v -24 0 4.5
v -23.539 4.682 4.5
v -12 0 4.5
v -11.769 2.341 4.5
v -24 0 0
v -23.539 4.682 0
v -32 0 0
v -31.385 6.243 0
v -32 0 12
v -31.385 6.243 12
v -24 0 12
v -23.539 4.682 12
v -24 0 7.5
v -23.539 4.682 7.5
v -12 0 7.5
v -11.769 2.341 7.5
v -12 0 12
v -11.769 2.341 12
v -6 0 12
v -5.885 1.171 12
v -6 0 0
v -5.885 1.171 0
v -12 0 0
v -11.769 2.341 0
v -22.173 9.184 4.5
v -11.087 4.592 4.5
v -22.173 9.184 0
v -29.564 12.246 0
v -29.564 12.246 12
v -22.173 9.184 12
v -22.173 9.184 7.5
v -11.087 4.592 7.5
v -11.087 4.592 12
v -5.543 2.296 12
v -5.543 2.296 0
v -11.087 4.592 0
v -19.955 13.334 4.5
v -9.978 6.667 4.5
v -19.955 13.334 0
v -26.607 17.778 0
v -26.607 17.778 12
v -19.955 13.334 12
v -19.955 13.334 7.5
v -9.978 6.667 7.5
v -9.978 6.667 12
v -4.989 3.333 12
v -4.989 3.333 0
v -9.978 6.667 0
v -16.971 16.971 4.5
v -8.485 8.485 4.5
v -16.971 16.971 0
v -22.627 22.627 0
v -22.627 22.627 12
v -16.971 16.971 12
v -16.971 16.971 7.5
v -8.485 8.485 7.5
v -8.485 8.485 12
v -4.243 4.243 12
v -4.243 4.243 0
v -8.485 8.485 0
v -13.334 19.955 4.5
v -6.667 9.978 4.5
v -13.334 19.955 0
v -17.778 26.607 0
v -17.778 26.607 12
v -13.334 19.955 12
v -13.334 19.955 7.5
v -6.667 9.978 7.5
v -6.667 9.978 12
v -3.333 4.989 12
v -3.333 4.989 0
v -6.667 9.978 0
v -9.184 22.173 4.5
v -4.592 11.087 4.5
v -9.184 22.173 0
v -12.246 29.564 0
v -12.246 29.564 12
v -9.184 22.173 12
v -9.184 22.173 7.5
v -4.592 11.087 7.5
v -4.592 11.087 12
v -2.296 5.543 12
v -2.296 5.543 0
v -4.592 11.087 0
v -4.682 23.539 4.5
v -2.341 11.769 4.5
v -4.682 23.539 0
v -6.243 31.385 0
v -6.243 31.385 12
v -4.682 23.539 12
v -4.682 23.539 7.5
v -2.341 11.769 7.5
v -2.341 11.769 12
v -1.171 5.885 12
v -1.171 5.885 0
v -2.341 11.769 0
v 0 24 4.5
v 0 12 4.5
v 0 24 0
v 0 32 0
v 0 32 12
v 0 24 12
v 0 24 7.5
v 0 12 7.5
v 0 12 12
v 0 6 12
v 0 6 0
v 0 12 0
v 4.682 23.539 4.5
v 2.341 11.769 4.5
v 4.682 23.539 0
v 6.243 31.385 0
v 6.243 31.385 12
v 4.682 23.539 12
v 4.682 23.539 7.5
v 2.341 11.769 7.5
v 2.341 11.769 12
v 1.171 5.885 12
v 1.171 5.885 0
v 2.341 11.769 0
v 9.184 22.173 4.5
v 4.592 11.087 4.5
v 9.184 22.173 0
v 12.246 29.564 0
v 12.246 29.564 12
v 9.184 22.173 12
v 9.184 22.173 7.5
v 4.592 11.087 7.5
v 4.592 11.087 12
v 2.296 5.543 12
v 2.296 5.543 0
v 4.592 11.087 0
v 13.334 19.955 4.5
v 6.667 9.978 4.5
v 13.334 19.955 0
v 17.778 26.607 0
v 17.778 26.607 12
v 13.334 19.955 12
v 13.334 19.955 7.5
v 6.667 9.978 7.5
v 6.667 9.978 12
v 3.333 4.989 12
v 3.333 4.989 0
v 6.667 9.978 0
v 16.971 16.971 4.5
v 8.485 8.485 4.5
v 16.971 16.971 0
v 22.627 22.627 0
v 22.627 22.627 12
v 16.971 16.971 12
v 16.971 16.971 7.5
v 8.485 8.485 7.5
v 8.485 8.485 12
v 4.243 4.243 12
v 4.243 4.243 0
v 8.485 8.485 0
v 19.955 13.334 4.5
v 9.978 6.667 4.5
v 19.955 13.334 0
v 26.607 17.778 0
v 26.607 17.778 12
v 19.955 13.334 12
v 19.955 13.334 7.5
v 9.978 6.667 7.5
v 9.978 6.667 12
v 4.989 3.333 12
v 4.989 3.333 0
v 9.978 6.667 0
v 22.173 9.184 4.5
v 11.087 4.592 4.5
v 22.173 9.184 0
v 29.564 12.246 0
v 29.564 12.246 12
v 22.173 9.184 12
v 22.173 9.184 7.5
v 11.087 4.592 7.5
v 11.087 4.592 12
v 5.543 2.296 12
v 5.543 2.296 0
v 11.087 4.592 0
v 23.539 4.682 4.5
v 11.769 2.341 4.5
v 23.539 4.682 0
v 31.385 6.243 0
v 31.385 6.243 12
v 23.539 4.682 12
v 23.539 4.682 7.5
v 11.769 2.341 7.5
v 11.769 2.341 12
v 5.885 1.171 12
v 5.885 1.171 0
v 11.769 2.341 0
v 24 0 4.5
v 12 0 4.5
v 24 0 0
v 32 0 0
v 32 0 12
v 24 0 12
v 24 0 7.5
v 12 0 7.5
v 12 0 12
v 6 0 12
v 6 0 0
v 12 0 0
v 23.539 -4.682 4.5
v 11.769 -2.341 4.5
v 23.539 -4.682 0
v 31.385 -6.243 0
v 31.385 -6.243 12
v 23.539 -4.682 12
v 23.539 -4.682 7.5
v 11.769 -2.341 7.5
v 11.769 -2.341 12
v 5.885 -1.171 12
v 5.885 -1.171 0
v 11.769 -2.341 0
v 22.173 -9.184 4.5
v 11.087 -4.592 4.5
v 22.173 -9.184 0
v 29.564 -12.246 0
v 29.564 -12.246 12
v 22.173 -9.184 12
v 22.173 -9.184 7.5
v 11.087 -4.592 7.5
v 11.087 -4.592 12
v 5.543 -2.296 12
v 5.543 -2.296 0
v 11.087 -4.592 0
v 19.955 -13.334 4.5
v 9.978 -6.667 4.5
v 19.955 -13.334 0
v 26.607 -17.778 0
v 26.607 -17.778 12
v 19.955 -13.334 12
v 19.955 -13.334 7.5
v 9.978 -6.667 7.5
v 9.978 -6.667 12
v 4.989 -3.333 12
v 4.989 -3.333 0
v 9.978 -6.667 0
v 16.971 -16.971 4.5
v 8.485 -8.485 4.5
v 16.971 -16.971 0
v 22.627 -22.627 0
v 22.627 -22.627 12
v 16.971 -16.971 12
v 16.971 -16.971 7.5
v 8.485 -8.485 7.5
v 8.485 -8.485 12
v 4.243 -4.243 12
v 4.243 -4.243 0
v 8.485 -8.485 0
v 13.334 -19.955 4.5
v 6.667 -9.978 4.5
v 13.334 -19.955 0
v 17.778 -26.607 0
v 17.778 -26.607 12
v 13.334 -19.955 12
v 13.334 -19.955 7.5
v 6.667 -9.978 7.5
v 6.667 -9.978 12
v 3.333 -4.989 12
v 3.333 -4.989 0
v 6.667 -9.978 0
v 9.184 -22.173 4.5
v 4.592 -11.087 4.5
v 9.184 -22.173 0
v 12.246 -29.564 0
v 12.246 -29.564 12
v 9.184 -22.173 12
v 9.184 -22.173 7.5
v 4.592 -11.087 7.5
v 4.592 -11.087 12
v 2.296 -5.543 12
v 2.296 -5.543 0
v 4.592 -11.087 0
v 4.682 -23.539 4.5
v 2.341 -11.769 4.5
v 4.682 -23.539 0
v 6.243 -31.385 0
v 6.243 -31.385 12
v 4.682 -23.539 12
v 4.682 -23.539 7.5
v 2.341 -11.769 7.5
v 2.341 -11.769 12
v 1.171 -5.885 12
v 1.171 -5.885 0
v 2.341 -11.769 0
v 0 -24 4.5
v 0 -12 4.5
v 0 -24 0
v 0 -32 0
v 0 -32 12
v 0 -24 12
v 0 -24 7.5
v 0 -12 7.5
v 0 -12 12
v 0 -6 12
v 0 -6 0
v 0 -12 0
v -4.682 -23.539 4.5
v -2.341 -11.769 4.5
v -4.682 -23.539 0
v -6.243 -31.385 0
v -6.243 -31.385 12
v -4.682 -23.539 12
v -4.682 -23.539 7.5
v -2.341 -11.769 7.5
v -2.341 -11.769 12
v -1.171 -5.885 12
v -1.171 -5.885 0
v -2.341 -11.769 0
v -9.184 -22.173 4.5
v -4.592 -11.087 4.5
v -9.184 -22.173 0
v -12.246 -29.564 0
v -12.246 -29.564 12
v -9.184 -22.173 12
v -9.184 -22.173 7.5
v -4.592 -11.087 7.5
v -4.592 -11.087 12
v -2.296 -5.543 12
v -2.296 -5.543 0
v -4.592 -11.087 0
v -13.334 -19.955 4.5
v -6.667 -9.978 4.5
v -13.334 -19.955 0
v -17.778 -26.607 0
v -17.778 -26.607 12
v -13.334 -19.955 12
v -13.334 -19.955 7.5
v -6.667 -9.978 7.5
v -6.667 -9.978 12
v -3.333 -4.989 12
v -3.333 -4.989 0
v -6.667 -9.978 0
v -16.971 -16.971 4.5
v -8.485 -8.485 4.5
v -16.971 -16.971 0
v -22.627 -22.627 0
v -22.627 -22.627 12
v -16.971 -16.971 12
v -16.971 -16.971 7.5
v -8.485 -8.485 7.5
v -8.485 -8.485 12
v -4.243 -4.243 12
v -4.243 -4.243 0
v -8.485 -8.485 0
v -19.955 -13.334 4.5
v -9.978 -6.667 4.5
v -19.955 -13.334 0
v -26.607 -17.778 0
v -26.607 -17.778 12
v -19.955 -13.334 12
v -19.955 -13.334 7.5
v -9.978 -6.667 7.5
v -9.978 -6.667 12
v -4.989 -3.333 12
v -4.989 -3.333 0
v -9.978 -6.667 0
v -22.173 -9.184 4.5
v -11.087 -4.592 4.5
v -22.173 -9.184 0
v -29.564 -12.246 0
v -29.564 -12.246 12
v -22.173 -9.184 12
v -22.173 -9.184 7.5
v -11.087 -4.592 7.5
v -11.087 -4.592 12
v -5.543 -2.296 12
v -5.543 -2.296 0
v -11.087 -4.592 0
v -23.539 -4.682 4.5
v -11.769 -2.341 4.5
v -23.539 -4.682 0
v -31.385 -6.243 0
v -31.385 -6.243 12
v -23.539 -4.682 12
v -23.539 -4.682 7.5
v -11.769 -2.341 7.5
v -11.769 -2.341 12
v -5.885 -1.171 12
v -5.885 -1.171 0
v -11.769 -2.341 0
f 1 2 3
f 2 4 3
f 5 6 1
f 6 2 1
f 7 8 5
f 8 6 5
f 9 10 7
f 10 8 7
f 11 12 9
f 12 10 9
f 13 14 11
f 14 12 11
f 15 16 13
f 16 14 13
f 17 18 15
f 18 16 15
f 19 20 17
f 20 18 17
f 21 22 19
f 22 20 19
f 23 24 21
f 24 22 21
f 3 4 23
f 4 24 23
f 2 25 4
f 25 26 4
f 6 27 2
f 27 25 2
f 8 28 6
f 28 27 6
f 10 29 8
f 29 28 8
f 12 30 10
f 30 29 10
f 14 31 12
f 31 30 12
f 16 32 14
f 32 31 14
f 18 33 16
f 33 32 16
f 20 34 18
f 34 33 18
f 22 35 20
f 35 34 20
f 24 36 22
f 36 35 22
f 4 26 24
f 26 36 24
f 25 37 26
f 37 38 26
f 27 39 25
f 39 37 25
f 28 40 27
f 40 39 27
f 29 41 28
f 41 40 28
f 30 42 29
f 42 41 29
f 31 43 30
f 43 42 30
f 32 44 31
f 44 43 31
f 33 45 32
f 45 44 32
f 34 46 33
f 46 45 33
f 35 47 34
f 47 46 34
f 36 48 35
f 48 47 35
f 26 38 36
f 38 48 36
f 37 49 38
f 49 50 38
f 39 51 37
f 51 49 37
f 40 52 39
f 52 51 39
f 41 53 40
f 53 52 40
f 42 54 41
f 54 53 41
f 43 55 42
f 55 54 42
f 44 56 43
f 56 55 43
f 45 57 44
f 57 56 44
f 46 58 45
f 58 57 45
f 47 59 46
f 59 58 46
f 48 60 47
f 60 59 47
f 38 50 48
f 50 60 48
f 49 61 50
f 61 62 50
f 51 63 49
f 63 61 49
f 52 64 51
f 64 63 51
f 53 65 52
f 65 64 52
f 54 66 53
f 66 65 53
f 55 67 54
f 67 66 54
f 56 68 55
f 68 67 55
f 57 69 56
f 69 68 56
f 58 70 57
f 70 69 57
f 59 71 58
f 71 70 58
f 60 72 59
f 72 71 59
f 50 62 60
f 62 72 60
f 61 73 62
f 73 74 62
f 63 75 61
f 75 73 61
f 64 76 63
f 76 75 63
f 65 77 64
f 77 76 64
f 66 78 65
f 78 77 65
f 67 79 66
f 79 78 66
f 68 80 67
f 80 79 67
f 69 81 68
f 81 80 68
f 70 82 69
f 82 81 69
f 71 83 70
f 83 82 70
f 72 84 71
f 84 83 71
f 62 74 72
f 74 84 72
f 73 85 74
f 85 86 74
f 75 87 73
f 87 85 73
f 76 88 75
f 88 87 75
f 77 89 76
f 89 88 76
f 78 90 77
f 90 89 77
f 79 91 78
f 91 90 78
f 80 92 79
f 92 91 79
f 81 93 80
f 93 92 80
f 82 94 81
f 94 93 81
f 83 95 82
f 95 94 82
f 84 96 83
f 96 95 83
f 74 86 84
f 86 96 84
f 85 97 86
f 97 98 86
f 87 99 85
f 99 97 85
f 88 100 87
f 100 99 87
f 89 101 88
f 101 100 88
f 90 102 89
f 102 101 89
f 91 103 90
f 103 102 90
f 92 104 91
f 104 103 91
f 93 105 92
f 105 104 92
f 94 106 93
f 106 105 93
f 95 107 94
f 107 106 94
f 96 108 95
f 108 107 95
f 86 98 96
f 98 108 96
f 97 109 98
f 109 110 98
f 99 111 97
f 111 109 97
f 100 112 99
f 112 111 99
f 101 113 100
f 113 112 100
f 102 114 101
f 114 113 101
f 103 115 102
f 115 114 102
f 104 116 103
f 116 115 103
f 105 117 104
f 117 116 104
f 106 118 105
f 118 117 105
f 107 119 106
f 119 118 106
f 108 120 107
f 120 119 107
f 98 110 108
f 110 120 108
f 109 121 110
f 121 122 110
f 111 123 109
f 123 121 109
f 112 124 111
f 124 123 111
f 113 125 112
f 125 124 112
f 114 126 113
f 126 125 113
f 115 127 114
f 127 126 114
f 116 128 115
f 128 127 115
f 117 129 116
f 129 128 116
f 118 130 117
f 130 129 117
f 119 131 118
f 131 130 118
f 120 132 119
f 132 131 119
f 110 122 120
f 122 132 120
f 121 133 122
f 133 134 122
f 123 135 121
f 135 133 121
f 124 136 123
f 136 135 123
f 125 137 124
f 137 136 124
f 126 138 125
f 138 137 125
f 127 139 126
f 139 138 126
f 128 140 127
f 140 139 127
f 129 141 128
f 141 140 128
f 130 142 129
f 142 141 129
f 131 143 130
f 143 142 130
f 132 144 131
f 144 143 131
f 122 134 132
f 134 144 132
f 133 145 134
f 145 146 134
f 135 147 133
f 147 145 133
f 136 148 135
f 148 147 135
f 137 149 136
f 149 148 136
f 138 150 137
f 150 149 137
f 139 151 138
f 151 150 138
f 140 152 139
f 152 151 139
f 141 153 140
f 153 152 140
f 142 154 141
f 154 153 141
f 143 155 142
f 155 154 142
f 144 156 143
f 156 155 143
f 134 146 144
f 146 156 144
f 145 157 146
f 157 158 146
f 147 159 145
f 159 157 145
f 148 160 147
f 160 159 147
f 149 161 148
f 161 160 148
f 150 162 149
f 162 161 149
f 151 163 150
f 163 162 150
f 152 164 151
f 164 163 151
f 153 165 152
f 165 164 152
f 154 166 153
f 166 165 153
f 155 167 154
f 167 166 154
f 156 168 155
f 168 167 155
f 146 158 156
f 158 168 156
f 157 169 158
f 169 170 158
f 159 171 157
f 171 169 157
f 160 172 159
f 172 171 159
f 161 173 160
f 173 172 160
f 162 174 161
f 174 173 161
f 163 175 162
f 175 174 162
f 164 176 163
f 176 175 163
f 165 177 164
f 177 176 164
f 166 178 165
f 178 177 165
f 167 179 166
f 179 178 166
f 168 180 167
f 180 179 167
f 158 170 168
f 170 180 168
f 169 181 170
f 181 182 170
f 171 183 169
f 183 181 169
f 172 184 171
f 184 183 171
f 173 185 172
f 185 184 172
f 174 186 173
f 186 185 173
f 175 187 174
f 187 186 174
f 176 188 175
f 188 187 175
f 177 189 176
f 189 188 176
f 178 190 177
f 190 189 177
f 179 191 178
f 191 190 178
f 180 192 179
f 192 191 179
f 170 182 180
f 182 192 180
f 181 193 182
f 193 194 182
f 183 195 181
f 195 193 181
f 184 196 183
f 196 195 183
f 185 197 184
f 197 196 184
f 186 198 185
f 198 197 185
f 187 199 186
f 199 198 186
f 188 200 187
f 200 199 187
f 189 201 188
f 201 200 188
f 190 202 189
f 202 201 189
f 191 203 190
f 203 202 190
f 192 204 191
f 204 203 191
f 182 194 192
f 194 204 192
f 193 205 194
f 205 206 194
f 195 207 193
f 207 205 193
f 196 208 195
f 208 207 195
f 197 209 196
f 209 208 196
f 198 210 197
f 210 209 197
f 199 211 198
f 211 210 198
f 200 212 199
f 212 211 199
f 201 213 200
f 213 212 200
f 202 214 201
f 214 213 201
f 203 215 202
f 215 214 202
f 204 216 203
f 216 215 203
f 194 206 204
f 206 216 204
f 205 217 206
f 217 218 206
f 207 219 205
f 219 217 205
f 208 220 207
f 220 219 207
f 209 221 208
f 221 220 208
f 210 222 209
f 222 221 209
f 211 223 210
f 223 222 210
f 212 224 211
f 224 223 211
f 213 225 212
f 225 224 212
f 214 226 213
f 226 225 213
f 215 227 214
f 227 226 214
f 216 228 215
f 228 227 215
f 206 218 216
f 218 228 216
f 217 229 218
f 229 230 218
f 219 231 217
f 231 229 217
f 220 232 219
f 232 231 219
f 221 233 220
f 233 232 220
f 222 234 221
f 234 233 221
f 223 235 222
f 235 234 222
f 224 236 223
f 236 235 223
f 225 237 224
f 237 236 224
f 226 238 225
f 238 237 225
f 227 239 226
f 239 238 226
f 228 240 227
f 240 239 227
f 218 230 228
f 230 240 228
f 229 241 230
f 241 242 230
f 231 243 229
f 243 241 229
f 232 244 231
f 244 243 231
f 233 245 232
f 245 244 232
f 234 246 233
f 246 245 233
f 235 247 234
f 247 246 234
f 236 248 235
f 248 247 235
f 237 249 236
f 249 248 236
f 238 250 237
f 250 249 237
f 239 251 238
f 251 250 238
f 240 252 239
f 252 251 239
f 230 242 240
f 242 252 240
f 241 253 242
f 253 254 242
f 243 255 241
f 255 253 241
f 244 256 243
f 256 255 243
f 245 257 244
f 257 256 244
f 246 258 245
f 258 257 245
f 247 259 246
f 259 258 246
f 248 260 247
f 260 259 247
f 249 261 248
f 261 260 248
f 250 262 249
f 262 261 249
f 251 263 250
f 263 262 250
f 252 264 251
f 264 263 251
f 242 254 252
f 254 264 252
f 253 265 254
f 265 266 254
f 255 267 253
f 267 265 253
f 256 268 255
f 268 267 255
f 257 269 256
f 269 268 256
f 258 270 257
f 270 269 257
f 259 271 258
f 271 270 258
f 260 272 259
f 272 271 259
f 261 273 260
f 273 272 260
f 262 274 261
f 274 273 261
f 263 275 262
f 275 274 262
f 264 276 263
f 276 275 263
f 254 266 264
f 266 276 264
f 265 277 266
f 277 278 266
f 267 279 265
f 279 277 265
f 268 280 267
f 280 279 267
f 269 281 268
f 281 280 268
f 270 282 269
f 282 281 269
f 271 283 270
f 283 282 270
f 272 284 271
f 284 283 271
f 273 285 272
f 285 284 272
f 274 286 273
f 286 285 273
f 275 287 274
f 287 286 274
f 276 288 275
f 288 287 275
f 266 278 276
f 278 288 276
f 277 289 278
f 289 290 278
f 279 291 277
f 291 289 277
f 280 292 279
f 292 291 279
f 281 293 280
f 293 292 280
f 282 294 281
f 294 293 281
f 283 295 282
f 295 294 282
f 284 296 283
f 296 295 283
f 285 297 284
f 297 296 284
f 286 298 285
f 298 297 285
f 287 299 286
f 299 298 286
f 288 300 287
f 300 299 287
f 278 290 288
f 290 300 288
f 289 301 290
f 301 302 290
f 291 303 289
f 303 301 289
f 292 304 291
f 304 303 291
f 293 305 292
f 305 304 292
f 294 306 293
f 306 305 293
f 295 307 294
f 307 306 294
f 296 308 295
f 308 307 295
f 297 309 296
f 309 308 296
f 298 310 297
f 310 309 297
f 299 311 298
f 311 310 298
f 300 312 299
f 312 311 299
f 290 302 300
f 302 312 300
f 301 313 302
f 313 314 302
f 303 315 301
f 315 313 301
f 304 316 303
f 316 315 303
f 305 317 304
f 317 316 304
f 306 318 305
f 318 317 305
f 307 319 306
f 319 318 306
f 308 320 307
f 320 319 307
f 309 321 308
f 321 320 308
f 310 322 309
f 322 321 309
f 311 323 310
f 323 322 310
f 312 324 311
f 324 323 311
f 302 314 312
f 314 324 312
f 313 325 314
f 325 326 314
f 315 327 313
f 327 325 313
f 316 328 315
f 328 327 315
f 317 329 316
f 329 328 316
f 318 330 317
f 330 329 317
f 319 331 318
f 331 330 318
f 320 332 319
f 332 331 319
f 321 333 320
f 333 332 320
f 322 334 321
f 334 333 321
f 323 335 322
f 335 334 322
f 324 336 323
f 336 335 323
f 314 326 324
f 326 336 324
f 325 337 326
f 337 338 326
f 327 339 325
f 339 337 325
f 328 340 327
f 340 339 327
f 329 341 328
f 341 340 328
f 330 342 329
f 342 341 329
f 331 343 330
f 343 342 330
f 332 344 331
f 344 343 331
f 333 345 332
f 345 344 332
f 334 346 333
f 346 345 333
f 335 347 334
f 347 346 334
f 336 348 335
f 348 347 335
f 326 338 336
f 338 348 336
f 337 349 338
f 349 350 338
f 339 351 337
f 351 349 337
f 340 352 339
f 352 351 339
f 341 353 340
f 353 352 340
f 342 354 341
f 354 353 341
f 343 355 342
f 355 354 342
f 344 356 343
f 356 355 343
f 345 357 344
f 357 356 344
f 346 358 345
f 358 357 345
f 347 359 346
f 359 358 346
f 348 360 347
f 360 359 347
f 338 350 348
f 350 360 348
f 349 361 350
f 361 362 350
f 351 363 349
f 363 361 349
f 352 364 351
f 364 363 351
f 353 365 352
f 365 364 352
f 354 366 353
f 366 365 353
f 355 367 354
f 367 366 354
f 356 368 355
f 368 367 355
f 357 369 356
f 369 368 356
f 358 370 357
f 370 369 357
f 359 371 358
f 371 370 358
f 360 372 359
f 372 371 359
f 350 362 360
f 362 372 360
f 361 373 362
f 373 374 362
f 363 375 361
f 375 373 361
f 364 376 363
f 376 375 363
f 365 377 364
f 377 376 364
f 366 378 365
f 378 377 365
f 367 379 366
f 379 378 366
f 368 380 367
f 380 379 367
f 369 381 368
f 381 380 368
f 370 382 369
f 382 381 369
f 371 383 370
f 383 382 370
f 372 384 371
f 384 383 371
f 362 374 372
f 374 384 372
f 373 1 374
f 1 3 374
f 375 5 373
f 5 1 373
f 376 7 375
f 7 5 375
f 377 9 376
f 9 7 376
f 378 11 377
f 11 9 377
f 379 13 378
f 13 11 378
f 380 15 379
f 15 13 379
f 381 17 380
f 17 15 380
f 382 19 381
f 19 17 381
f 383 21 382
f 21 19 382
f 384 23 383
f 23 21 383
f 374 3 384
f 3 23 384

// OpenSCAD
$fn = 32;

// ----------------------------------------------------------------------
// Revolved part: handwheel R32
// ----------------------------------------------------------------------

// --- parameters (mm) ---
bore_r = 6;               // bore radius
rim_r = 32;               // rim radius
rim_w = 8;                // rim axial width
rim_t = 12;               // rim diameter height
hub_r = 12;               // hub radius
web_t = 3;                // web thickness
revolve_angle = 360;      // revolve sweep, degrees

bore_d = 2 * bore_r;
rim_d = 2 * rim_r;
hub_d = 2 * hub_r;

profile = [[6, 0], [12, 0], [12, 4.5], [24, 4.5], [24, 0], [32, 0], [32, 12], [24, 12], [24, 7.5], [12, 7.5], [12, 12], [6, 12]];  // primary outline, 12 points, counter clockwise

// --- the one profile operation ---
rotate_extrude(angle = revolve_angle) polygon(points = profile);
